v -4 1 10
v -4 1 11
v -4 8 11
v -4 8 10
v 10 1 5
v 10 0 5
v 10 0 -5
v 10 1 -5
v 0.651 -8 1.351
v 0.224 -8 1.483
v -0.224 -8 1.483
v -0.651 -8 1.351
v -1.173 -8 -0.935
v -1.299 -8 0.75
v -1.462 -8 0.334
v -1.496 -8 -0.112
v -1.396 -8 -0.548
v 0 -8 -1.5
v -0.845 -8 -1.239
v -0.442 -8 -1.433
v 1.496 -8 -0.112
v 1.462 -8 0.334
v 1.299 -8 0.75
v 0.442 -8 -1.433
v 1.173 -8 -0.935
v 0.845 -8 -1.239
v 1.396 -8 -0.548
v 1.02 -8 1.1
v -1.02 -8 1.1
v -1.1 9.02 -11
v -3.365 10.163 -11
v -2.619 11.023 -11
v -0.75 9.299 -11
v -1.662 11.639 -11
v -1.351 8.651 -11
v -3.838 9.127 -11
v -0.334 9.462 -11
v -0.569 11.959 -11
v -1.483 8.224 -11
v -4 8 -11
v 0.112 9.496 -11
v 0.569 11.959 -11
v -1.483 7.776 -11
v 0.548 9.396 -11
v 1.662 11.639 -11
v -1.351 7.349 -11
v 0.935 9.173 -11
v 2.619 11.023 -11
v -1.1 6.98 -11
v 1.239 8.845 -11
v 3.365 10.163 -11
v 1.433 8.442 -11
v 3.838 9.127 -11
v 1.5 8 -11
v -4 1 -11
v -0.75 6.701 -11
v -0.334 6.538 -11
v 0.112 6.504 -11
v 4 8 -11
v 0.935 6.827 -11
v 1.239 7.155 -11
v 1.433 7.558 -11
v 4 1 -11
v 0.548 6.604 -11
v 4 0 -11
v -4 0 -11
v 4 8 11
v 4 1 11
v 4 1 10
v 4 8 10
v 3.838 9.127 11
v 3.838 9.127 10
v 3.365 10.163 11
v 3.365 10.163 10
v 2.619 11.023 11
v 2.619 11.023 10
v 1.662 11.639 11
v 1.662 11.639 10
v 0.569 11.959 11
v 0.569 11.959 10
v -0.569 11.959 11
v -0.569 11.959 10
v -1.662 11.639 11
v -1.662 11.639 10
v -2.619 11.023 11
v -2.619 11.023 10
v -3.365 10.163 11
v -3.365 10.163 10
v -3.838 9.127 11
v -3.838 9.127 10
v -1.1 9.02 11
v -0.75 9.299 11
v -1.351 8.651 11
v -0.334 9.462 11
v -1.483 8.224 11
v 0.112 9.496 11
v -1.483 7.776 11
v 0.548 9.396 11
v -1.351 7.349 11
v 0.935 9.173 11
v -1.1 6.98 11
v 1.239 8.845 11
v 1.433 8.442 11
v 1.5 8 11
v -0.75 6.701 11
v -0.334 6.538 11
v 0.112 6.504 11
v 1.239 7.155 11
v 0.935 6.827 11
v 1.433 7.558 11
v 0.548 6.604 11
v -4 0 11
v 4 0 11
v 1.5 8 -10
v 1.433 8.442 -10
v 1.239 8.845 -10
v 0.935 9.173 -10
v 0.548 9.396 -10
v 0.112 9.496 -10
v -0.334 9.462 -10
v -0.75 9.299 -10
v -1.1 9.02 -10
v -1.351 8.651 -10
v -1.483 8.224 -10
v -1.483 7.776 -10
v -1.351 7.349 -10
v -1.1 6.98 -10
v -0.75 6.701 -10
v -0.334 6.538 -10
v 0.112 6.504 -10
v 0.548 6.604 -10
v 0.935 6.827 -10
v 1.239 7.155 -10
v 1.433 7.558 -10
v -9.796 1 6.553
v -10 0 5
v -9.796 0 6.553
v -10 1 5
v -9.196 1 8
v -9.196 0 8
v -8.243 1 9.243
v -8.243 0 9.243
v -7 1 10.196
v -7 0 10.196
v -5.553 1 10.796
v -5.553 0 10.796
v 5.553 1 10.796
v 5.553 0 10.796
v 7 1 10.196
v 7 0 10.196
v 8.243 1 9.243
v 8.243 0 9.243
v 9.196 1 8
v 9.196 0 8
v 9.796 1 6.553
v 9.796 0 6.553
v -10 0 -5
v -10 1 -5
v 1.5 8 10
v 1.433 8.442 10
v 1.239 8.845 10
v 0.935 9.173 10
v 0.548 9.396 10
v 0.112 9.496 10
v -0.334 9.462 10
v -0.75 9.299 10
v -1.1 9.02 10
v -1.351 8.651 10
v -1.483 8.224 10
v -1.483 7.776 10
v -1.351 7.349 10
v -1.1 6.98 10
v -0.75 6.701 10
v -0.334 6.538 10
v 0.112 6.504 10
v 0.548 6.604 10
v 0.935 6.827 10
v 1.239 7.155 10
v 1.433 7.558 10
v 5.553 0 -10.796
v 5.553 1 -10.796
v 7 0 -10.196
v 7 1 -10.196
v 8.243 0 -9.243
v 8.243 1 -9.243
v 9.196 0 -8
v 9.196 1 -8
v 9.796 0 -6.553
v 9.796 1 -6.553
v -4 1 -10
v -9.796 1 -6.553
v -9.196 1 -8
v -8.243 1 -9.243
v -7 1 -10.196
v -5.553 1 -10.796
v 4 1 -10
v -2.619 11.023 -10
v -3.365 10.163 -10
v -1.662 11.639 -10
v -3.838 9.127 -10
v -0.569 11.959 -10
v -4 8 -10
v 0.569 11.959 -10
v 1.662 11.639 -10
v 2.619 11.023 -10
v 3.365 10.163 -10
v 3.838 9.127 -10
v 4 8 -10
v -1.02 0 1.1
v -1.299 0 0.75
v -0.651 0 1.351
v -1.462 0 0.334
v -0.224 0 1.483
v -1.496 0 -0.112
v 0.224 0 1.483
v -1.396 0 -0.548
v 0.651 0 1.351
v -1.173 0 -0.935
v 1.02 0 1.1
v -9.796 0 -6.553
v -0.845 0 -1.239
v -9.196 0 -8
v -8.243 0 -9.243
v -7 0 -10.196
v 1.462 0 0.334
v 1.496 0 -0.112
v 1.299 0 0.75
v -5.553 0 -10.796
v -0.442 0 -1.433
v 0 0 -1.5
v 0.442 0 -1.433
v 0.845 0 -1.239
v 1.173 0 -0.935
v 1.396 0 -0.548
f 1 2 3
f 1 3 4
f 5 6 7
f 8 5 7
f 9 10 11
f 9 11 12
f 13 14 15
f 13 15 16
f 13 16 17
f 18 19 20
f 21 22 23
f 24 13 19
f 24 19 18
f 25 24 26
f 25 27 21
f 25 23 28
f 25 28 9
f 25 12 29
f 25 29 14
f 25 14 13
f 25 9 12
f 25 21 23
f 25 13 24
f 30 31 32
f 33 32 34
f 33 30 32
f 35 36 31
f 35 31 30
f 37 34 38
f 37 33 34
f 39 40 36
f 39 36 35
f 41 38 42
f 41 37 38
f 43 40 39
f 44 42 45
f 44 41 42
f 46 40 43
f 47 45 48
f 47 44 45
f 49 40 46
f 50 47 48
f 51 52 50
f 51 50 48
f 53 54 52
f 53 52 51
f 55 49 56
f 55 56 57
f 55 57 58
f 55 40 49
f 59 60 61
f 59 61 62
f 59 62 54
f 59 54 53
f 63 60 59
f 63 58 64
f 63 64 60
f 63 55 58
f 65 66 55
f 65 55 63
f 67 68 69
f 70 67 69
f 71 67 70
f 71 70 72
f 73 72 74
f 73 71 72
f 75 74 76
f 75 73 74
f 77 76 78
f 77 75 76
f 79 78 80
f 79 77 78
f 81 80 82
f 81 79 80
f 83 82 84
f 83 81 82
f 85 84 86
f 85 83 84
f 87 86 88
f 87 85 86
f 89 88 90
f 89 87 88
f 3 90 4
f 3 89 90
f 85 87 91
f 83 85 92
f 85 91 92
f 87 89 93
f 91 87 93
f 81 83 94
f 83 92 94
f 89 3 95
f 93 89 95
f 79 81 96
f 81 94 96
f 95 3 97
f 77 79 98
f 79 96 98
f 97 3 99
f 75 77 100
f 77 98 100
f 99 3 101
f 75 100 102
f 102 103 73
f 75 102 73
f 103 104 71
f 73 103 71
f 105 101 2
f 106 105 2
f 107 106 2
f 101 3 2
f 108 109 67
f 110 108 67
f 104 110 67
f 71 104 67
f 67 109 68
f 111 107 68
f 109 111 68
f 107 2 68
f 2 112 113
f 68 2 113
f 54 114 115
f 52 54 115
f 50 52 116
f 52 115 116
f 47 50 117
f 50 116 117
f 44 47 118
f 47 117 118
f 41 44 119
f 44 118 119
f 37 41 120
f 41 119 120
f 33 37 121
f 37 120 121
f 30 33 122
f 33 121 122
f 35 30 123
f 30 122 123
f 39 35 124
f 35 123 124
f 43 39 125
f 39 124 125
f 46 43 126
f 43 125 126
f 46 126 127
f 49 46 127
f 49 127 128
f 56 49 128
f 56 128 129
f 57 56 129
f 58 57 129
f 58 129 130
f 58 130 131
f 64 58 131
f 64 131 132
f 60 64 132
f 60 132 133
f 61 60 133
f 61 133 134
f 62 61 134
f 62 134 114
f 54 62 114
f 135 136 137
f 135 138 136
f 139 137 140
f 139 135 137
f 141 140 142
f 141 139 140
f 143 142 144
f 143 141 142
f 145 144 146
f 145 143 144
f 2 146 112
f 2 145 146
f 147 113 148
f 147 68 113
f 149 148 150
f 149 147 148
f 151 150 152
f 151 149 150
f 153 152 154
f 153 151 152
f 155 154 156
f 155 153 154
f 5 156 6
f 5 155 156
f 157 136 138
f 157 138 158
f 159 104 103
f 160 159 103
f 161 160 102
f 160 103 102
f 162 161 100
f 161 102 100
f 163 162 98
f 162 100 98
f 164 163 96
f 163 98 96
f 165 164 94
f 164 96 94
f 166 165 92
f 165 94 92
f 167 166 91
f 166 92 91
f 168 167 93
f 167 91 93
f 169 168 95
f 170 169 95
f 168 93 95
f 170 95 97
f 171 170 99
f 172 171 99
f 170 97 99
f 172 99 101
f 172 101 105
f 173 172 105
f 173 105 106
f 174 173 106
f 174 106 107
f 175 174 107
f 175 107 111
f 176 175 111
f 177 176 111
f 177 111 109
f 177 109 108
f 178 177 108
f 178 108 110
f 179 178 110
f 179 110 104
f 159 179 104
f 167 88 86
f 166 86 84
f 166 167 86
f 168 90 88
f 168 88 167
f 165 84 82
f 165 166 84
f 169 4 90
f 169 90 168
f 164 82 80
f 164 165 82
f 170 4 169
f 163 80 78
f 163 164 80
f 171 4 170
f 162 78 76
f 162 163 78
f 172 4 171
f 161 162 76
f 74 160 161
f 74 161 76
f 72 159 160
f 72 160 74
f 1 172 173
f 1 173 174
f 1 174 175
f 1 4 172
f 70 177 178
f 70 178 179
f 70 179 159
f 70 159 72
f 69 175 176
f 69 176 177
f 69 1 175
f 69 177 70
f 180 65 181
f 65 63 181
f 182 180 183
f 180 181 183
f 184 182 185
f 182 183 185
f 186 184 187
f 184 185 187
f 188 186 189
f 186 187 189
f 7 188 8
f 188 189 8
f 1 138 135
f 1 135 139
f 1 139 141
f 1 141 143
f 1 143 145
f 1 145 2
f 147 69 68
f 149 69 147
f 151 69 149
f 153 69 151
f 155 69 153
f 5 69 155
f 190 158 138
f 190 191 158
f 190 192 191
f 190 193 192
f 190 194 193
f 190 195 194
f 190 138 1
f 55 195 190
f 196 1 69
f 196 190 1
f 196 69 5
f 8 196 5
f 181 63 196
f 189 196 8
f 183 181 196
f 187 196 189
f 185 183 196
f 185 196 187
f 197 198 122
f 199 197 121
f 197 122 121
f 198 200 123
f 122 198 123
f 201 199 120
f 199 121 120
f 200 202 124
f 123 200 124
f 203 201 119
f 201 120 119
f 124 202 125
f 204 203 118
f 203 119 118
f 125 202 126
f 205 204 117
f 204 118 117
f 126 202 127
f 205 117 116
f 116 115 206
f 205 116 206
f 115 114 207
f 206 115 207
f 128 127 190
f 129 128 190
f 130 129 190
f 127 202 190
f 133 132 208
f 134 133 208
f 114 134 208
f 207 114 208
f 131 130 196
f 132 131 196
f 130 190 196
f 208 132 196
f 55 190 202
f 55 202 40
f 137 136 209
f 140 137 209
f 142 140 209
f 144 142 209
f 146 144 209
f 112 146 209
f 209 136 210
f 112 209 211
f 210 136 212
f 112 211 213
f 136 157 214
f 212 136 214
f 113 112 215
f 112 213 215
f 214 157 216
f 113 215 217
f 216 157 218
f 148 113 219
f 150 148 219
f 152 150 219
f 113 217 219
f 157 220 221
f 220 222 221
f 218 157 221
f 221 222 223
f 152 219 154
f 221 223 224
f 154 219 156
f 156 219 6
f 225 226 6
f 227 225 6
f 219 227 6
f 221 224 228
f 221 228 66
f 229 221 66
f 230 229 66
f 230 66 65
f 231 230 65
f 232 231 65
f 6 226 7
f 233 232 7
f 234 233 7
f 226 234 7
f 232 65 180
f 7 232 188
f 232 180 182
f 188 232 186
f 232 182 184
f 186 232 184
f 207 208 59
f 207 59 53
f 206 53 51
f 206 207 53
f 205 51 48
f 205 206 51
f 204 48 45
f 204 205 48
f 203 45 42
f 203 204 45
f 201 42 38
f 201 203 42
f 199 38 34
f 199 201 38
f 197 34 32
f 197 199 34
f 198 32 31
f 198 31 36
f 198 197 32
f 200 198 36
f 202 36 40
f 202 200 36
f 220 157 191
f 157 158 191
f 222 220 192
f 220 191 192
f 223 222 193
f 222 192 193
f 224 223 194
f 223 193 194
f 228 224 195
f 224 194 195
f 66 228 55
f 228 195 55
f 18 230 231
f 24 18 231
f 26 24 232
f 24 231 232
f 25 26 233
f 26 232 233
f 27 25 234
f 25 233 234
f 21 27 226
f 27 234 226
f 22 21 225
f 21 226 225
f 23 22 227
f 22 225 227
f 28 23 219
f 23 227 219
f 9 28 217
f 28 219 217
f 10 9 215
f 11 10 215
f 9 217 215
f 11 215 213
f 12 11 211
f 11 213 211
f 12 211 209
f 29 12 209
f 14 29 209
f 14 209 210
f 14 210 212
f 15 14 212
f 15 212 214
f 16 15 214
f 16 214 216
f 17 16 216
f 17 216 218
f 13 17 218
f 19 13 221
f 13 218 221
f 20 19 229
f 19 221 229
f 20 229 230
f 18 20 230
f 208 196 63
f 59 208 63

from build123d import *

# Parameters (mm, degrees)
CROQUIS1_W              = 20
CROQUIS1_H              = 22
SALIENTE_EXTRUIR1_DEPTH = 1
CROQUIS2_W              = 8
CROQUIS2_H              = 1
SALIENTE_EXTRUIR2_DEPTH = 20
CROQUIS3_R              = 1.5
CORTAR_EXTRUIR1_DEPTH   = 33.015621187
CROQUIS4_R              = 1.5
SALIENTE_EXTRUIR3_DEPTH = 8
REDONDEO1_R             = 6


with BuildPart() as part:
    # Croquis1 → Saliente-Extruir1 (new body)
    with BuildSketch(Plane(origin=(0, 0, 0), x_dir=(1, 0, 0), z_dir=(0, 1, 0))):
        Rectangle(CROQUIS1_W, CROQUIS1_H)
    extrude(amount=SALIENTE_EXTRUIR1_DEPTH)

    # Croquis2 → Saliente-Extruir2 (add)
    with BuildSketch(Plane(origin=(0, 1, 0), x_dir=(1, 0, 0), z_dir=(0, 1, 0))):
        with Locations((0, -10.5)):
            Rectangle(CROQUIS2_W, CROQUIS2_H)
        with Locations((0, 10.5)):
            Rectangle(CROQUIS2_W, CROQUIS2_H)
    extrude(amount=SALIENTE_EXTRUIR2_DEPTH)

    # Croquis3 → Cortar-Extruir1 (cut, through all)
    with BuildSketch(Plane.XY.offset(11)):
        with Locations((0, 8)):
            Circle(CROQUIS3_R)
        with BuildLine():
            Line((-4, 8), (-13.08141652, 8))
            Line((-13.08141652, 8), (-13.08141652, 28.561512487))
            Line((-13.08141652, 28.561512487), (15.549721507, 28.561512487))
            Line((15.549721507, 28.561512487), (15.549721507, 8))
            Line((15.549721507, 8), (4, 8))
            ThreePointArc((4, 8), (0, 12), (-4, 8))
        make_face()
    extrude(amount=-CORTAR_EXTRUIR1_DEPTH, mode=Mode.SUBTRACT)

    # Croquis4 → Saliente-Extruir3 (add)
    with BuildSketch(Plane.XZ):
        with Locations(Location((0, 0, 0), (0, 0, 270))):
            Circle(CROQUIS4_R)
    extrude(amount=SALIENTE_EXTRUIR3_DEPTH)

    # Redondeo1
    redondeo1_edges = [part.edges().sort_by_distance(p)[0] for p in [
        (-10, 0.5, -11),
        (-10, 0.5, 11),
        (10, 0.5, -11),
        (10, 0.5, 11),
    ]]
    fillet(redondeo1_edges, radius=REDONDEO1_R)


solid = part.part
